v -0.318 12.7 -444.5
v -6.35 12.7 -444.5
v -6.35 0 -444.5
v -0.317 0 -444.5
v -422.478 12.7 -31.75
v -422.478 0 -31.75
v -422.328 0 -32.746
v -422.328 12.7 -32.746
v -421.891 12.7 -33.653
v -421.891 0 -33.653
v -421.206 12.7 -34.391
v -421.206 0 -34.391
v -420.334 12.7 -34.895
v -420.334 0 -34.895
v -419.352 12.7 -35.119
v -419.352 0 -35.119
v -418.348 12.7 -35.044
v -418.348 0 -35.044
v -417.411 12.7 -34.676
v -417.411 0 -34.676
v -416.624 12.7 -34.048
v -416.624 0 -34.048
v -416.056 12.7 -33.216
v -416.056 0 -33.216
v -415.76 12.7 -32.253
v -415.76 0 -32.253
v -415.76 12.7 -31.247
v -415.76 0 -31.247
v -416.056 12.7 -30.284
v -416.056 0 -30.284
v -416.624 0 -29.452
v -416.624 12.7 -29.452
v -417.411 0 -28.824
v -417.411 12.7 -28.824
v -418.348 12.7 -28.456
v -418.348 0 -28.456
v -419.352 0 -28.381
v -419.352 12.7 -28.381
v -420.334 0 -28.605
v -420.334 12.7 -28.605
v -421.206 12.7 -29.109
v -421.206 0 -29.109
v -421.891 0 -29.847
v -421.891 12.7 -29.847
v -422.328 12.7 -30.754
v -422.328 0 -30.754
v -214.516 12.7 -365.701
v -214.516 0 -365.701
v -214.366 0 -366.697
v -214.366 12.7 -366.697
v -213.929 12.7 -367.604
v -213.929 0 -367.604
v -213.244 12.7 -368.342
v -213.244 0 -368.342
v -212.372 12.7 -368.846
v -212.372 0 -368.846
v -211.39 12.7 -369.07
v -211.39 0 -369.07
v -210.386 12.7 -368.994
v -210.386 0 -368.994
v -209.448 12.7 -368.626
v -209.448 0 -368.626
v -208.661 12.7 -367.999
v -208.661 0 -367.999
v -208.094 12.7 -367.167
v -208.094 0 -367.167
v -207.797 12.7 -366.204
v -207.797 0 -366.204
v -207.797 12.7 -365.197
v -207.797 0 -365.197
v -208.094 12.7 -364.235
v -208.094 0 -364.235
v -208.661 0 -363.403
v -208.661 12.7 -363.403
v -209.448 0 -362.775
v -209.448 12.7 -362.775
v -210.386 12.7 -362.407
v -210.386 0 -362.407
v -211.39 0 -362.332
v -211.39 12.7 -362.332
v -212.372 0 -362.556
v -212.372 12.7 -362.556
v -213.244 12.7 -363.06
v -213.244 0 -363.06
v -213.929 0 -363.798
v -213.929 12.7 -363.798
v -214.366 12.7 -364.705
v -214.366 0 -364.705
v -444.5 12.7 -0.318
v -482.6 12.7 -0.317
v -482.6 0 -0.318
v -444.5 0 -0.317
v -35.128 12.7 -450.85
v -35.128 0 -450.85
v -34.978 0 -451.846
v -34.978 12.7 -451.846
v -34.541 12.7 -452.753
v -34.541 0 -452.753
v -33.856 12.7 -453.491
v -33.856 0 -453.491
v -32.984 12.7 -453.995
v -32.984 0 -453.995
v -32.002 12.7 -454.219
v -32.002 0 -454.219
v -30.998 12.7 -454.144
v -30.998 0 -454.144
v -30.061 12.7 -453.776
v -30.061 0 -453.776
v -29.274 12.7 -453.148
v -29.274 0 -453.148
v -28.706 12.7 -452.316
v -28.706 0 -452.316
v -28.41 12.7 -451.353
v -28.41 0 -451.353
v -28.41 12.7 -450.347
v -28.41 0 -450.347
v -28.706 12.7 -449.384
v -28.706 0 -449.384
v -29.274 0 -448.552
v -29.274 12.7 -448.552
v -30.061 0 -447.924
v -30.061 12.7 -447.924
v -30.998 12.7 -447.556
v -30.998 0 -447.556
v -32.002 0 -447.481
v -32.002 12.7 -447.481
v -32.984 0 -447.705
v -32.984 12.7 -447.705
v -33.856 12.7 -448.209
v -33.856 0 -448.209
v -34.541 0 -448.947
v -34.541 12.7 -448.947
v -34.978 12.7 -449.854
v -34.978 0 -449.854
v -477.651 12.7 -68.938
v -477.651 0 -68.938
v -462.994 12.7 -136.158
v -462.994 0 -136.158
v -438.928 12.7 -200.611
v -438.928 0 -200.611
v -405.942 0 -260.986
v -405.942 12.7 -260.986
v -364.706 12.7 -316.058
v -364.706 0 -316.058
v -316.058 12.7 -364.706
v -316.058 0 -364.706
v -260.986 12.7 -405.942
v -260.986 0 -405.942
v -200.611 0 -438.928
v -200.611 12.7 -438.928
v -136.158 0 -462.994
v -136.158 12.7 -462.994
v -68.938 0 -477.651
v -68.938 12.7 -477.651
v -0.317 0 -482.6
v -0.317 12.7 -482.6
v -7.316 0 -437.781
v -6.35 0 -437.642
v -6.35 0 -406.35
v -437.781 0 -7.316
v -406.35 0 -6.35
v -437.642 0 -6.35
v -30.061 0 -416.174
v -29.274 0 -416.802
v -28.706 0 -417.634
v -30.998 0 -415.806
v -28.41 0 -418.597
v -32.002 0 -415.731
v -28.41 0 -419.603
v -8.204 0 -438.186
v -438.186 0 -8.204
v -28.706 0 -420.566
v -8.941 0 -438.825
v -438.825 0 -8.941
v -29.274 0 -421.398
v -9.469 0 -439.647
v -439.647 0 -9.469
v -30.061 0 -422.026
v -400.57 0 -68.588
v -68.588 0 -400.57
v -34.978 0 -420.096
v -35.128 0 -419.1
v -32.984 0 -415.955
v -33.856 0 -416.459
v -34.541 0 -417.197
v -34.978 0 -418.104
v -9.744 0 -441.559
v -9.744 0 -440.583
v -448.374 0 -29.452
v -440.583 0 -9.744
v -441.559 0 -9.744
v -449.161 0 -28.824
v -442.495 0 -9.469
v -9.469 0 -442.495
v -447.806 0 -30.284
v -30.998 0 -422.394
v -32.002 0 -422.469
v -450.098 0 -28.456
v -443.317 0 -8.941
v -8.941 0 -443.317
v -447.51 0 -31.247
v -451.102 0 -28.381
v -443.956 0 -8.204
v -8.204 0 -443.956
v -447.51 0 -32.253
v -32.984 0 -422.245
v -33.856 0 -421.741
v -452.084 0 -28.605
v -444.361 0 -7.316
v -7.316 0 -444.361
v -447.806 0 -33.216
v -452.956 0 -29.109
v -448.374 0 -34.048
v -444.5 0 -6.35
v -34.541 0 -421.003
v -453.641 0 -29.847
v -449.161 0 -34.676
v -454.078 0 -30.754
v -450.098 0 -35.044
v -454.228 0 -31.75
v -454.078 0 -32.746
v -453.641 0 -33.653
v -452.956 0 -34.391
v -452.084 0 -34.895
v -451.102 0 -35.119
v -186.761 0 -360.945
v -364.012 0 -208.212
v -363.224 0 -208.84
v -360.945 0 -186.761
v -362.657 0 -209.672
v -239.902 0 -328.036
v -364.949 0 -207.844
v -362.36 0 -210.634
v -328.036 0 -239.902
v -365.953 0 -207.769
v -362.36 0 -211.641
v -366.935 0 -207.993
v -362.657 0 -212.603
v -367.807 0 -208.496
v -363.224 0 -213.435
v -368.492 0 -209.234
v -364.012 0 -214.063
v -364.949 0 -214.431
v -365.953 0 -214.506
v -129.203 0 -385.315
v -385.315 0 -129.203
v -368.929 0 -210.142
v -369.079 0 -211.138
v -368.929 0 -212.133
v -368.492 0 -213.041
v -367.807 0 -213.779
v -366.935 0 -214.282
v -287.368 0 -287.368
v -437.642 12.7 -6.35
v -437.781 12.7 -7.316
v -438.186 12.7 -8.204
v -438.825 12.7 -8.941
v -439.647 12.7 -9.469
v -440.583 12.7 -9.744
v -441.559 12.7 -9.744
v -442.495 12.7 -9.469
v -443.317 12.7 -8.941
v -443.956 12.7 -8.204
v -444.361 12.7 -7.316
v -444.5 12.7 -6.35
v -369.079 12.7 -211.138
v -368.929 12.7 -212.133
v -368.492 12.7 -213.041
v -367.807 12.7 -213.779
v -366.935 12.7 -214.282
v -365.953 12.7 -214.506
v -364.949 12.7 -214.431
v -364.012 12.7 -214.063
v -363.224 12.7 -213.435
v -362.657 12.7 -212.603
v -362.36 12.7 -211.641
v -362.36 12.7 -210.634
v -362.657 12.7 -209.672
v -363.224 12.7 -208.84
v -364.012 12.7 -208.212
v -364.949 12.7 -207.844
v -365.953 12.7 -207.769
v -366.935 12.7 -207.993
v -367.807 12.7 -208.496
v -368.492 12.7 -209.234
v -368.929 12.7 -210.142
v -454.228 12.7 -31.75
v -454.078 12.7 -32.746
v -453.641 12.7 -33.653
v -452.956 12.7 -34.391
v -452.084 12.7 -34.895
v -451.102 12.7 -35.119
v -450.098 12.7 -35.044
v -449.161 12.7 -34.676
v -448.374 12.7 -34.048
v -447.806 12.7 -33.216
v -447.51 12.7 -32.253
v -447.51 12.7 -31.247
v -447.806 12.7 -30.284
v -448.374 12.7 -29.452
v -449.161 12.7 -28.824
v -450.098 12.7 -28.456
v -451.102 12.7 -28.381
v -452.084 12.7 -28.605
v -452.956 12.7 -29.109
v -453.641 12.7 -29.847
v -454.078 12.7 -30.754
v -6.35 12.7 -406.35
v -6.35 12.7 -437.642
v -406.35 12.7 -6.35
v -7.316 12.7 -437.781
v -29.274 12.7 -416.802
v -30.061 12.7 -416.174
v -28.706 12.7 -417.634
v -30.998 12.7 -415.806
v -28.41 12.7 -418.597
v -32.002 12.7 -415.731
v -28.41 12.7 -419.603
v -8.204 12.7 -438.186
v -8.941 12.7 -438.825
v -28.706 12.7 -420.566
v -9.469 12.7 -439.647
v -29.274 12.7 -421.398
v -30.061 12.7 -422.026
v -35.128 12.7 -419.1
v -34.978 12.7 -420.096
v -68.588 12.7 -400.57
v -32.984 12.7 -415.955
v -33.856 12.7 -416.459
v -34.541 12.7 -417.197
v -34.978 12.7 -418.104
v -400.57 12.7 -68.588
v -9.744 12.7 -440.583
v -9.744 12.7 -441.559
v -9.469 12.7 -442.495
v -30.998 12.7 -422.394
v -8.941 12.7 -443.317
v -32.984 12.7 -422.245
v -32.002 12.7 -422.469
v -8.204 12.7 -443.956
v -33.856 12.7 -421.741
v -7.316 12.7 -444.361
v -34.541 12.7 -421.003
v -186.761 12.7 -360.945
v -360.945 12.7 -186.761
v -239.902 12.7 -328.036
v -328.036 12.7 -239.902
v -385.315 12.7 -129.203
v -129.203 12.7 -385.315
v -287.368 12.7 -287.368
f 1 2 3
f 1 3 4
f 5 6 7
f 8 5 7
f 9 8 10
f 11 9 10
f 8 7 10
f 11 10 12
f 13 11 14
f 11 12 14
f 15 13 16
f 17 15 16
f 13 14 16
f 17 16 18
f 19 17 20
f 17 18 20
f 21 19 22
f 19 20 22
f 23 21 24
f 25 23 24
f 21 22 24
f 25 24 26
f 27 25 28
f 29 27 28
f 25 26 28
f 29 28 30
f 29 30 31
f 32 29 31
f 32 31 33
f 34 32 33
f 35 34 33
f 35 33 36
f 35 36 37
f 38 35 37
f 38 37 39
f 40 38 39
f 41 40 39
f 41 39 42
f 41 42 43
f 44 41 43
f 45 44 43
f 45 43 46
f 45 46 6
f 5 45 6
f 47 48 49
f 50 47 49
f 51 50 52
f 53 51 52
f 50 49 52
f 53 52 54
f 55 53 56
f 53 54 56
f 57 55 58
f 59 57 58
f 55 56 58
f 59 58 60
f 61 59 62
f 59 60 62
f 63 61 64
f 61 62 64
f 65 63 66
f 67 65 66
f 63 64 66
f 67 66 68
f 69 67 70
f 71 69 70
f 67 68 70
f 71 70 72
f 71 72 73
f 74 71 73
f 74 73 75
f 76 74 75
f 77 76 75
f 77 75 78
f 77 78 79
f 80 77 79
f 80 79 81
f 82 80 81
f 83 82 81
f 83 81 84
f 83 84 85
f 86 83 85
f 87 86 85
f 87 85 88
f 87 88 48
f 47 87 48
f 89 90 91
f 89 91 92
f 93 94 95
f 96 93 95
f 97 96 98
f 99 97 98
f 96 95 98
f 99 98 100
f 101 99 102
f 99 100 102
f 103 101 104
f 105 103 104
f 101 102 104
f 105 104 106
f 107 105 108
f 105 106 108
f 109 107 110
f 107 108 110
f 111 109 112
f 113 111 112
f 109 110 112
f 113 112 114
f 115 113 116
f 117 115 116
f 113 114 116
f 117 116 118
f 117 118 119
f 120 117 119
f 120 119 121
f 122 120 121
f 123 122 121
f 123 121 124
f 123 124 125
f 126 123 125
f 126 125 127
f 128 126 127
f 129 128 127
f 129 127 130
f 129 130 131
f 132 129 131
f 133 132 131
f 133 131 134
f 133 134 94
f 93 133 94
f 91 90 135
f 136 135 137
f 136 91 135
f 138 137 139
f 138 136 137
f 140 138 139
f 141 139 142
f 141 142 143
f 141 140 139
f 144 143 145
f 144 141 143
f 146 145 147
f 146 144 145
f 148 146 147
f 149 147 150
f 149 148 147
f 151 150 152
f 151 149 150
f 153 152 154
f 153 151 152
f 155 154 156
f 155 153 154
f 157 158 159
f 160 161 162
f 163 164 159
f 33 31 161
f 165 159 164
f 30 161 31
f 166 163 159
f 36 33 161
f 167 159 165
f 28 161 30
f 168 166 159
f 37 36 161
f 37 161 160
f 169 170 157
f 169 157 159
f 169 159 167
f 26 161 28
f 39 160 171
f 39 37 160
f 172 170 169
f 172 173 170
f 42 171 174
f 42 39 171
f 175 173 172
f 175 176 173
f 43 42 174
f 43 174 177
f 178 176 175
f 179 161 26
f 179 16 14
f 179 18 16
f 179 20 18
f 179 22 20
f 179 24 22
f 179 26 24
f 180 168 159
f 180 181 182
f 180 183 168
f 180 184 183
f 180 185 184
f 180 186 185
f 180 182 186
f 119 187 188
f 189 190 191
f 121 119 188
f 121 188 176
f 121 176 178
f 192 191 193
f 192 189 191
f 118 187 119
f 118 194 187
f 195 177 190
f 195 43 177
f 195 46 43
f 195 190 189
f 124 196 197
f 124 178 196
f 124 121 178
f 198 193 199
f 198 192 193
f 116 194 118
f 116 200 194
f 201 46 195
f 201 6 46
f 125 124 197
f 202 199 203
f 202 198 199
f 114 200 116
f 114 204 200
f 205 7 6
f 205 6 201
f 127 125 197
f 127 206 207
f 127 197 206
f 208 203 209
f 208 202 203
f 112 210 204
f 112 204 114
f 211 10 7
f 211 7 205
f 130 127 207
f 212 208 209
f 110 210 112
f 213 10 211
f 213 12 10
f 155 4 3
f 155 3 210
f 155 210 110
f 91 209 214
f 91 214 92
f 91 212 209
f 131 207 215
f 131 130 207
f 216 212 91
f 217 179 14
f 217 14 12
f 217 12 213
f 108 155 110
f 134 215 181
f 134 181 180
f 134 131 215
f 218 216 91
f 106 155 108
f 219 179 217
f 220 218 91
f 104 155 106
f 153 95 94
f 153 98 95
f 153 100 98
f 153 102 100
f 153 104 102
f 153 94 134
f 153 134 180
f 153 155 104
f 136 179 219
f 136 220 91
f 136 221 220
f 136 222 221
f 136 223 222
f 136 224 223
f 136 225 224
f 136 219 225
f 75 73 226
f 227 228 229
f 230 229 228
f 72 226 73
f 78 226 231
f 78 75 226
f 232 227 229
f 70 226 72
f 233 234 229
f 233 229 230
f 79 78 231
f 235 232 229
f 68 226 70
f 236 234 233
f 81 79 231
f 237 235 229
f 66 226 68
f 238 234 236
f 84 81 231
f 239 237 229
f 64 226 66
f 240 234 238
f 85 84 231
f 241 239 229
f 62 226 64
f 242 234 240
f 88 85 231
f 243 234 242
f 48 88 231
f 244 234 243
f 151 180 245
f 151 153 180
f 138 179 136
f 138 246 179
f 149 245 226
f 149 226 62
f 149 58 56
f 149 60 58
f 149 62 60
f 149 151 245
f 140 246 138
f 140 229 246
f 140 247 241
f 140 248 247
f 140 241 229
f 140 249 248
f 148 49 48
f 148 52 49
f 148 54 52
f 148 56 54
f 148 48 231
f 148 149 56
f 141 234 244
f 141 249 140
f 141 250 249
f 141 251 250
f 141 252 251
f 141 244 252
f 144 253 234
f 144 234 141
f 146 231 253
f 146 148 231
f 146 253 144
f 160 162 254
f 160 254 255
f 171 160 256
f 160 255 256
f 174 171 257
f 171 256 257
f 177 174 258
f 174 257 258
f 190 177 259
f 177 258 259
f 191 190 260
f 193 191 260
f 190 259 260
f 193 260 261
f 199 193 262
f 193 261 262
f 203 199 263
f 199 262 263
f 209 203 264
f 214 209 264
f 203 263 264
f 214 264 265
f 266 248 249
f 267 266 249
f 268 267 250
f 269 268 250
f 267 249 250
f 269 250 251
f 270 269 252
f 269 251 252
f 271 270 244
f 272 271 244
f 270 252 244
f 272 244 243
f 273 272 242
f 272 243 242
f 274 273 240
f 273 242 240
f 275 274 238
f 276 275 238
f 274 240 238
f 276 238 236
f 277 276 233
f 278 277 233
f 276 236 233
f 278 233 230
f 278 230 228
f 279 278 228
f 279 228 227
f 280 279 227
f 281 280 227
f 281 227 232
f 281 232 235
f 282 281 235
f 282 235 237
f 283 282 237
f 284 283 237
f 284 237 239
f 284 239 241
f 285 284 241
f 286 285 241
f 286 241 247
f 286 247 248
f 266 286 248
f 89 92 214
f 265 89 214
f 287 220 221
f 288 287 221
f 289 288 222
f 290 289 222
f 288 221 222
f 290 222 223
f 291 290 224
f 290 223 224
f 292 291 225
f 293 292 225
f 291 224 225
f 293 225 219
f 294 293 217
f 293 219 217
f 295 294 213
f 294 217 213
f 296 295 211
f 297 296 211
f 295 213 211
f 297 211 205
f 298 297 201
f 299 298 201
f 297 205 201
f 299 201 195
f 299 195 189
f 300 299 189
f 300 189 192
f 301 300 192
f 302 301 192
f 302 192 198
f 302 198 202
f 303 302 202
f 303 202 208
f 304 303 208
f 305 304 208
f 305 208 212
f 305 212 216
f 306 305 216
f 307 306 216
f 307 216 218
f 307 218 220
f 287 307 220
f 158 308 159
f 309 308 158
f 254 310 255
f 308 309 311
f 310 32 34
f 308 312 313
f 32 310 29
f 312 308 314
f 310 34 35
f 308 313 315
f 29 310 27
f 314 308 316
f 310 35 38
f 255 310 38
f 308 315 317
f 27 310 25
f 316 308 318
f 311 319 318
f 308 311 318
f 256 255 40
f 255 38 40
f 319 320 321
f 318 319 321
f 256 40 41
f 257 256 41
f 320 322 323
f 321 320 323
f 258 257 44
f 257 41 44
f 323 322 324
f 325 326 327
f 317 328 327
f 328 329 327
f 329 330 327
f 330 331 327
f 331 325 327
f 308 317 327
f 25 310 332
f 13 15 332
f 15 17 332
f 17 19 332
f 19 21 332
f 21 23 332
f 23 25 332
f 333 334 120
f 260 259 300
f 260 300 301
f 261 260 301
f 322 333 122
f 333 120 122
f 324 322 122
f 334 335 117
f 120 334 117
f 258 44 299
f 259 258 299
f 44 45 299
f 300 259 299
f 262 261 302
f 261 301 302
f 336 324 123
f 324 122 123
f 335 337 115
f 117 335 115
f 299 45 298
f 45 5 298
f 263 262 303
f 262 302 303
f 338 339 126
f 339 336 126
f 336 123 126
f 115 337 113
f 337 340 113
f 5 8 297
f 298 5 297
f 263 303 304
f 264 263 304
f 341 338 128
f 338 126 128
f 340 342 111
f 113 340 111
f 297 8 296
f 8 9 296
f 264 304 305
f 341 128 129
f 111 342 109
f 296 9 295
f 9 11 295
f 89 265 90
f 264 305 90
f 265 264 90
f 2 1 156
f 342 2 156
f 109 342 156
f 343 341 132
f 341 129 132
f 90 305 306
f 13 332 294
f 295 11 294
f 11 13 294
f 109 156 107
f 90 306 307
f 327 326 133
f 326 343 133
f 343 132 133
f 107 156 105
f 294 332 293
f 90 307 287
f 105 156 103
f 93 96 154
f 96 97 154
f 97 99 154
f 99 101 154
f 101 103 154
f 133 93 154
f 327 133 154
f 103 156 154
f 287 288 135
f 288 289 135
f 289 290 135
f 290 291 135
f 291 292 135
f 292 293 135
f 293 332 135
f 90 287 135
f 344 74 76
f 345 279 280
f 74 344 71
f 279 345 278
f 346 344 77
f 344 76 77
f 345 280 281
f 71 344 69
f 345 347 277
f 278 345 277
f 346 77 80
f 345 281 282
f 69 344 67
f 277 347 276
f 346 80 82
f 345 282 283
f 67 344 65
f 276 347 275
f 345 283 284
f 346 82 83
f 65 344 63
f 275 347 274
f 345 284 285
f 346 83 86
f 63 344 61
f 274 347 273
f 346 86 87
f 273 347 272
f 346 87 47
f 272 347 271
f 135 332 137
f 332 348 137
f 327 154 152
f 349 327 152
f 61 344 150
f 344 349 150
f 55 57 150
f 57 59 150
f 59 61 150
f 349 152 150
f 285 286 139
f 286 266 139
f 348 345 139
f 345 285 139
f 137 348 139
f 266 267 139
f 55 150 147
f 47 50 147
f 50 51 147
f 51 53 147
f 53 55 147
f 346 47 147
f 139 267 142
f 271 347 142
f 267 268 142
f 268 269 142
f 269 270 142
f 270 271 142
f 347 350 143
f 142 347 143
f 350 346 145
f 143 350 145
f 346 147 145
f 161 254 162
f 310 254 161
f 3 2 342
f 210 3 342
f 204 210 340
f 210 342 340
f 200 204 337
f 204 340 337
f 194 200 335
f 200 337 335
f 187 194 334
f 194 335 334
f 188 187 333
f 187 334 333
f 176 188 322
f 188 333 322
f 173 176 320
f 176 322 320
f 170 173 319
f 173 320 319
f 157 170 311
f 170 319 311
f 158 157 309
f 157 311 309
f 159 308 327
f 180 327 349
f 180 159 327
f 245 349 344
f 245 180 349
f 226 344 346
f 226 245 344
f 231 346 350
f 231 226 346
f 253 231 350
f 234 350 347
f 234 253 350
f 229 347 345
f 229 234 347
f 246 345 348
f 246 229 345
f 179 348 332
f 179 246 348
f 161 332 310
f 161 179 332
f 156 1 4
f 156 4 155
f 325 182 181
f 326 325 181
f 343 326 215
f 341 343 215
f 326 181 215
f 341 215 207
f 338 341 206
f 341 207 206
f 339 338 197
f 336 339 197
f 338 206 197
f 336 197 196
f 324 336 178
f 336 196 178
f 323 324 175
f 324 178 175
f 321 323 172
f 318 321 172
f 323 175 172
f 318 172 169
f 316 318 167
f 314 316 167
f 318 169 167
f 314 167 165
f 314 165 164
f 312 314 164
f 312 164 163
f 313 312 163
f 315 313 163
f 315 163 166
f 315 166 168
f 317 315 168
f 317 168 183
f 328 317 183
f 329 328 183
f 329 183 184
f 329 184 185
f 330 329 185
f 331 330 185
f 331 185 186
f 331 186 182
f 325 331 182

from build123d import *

# Parameters (mm, degrees)
BOSS_EXTRUDE1_DEPTH     = 12.7
SKETCH2_W               = 12.7
SKETCH2_H               = 38.149612403
SKETCH2_W_2             = 38.149612403
SKETCH2_H_2             = 12.7
CUT_EXTRUDE1_DEPTH      = 13.7
SKETCH3_R               = 3.429
CUT_EXTRUDE2_DEPTH      = 13.7
F_1_4_CLEARANCE_HOLE1_D = 6.7564
SKETCH8_W               = 482.6
SKETCH8_H               = 482.6
CUT_EXTRUDE4_DEPTH      = 13.7
SKETCH9_W               = 0.3175
SKETCH9_H               = 38.1
SKETCH9_W_2             = 38.1
SKETCH9_H_2             = 0.3175
CUT_EXTRUDE5_DEPTH      = 13.7


with BuildPart() as part:
    # Sketch1 → Boss-Extrude1 (new body)
    with BuildSketch(Plane(origin=(0, 0, 0), x_dir=(1, 0, 0), z_dir=(0, 1, 0))):
        with BuildLine():
            Line((-406.4, 0), (-482.6, 0))
            ThreePointArc((-482.6, 0), (0, 482.6), (482.6, 0))
            Line((482.6, 0), (406.4, 0))
            ThreePointArc((406.4, 0), (0, 406.4), (-406.4, 0))
        make_face()
    extrude(amount=BOSS_EXTRUDE1_DEPTH)

    # Sketch2 → Cut-Extrude1 (cut, through all)
    with BuildSketch(Plane(origin=(0, 12.7, 0), x_dir=(1, 0, 0), z_dir=(0, 1, 0))):
        with Locations((0, 425.425193799)):
            Rectangle(SKETCH2_W, SKETCH2_H)
        with Locations((425.425193799, 0)):
            Rectangle(SKETCH2_W_2, SKETCH2_H_2)
        with Locations((0, -425.425193799)):
            Rectangle(SKETCH2_W, SKETCH2_H)
        with Locations((-425.425193799, 0)):
            Rectangle(SKETCH2_W_2, SKETCH2_H_2)
    extrude(amount=-CUT_EXTRUDE1_DEPTH, mode=Mode.SUBTRACT)

    # Sketch3 → Cut-Extrude2 (cut, through all)
    with BuildSketch(Plane(origin=(0, 12.7, 0), x_dir=(1, 0, 0), z_dir=(0, 1, 0))):
        with Locations((-6.35, 441.071)):
            Circle(SKETCH3_R)
        with Locations((-441.071, 6.35)):
            Circle(SKETCH3_R)
        with Locations((6.35, 441.071)):
            Circle(SKETCH3_R)
        with Locations((441.071, 6.35)):
            Circle(SKETCH3_R)
    extrude(amount=-CUT_EXTRUDE2_DEPTH, mode=Mode.SUBTRACT)

    # 1/4 Clearance Hole1 (through all)
    with Locations(Plane(origin=(0, 12.7, 0), x_dir=(1, 0, 0), z_dir=(0, 1, 0))):
        with Locations((-365.700877383, 211.1375), (-31.75, 419.1), (-31.75, 450.85), (-419.1, 31.75), (-450.85, 31.75), (-211.1375, 365.700877383)):
            Hole(F_1_4_CLEARANCE_HOLE1_D / 2)

    # Sketch8 → Cut-Extrude4 (cut, through all)
    with BuildSketch(Plane(origin=(0, 12.7, 0), x_dir=(1, 0, 0), z_dir=(0, 1, 0))):
        with Locations((241.3, 241.3)):
            Rectangle(SKETCH8_W, SKETCH8_H)
    extrude(amount=-CUT_EXTRUDE4_DEPTH, mode=Mode.SUBTRACT)

    # Sketch9 → Cut-Extrude5 (cut, through all)
    with BuildSketch(Plane(origin=(0, 12.7, 0), x_dir=(1, 0, 0), z_dir=(0, 1, 0))):
        with Locations((-0.15875, 463.55)):
            Rectangle(SKETCH9_W, SKETCH9_H)
        with Locations((-463.55, 0.15875)):
            Rectangle(SKETCH9_W_2, SKETCH9_H_2)
    extrude(amount=-CUT_EXTRUDE5_DEPTH, mode=Mode.SUBTRACT)


solid = part.part
